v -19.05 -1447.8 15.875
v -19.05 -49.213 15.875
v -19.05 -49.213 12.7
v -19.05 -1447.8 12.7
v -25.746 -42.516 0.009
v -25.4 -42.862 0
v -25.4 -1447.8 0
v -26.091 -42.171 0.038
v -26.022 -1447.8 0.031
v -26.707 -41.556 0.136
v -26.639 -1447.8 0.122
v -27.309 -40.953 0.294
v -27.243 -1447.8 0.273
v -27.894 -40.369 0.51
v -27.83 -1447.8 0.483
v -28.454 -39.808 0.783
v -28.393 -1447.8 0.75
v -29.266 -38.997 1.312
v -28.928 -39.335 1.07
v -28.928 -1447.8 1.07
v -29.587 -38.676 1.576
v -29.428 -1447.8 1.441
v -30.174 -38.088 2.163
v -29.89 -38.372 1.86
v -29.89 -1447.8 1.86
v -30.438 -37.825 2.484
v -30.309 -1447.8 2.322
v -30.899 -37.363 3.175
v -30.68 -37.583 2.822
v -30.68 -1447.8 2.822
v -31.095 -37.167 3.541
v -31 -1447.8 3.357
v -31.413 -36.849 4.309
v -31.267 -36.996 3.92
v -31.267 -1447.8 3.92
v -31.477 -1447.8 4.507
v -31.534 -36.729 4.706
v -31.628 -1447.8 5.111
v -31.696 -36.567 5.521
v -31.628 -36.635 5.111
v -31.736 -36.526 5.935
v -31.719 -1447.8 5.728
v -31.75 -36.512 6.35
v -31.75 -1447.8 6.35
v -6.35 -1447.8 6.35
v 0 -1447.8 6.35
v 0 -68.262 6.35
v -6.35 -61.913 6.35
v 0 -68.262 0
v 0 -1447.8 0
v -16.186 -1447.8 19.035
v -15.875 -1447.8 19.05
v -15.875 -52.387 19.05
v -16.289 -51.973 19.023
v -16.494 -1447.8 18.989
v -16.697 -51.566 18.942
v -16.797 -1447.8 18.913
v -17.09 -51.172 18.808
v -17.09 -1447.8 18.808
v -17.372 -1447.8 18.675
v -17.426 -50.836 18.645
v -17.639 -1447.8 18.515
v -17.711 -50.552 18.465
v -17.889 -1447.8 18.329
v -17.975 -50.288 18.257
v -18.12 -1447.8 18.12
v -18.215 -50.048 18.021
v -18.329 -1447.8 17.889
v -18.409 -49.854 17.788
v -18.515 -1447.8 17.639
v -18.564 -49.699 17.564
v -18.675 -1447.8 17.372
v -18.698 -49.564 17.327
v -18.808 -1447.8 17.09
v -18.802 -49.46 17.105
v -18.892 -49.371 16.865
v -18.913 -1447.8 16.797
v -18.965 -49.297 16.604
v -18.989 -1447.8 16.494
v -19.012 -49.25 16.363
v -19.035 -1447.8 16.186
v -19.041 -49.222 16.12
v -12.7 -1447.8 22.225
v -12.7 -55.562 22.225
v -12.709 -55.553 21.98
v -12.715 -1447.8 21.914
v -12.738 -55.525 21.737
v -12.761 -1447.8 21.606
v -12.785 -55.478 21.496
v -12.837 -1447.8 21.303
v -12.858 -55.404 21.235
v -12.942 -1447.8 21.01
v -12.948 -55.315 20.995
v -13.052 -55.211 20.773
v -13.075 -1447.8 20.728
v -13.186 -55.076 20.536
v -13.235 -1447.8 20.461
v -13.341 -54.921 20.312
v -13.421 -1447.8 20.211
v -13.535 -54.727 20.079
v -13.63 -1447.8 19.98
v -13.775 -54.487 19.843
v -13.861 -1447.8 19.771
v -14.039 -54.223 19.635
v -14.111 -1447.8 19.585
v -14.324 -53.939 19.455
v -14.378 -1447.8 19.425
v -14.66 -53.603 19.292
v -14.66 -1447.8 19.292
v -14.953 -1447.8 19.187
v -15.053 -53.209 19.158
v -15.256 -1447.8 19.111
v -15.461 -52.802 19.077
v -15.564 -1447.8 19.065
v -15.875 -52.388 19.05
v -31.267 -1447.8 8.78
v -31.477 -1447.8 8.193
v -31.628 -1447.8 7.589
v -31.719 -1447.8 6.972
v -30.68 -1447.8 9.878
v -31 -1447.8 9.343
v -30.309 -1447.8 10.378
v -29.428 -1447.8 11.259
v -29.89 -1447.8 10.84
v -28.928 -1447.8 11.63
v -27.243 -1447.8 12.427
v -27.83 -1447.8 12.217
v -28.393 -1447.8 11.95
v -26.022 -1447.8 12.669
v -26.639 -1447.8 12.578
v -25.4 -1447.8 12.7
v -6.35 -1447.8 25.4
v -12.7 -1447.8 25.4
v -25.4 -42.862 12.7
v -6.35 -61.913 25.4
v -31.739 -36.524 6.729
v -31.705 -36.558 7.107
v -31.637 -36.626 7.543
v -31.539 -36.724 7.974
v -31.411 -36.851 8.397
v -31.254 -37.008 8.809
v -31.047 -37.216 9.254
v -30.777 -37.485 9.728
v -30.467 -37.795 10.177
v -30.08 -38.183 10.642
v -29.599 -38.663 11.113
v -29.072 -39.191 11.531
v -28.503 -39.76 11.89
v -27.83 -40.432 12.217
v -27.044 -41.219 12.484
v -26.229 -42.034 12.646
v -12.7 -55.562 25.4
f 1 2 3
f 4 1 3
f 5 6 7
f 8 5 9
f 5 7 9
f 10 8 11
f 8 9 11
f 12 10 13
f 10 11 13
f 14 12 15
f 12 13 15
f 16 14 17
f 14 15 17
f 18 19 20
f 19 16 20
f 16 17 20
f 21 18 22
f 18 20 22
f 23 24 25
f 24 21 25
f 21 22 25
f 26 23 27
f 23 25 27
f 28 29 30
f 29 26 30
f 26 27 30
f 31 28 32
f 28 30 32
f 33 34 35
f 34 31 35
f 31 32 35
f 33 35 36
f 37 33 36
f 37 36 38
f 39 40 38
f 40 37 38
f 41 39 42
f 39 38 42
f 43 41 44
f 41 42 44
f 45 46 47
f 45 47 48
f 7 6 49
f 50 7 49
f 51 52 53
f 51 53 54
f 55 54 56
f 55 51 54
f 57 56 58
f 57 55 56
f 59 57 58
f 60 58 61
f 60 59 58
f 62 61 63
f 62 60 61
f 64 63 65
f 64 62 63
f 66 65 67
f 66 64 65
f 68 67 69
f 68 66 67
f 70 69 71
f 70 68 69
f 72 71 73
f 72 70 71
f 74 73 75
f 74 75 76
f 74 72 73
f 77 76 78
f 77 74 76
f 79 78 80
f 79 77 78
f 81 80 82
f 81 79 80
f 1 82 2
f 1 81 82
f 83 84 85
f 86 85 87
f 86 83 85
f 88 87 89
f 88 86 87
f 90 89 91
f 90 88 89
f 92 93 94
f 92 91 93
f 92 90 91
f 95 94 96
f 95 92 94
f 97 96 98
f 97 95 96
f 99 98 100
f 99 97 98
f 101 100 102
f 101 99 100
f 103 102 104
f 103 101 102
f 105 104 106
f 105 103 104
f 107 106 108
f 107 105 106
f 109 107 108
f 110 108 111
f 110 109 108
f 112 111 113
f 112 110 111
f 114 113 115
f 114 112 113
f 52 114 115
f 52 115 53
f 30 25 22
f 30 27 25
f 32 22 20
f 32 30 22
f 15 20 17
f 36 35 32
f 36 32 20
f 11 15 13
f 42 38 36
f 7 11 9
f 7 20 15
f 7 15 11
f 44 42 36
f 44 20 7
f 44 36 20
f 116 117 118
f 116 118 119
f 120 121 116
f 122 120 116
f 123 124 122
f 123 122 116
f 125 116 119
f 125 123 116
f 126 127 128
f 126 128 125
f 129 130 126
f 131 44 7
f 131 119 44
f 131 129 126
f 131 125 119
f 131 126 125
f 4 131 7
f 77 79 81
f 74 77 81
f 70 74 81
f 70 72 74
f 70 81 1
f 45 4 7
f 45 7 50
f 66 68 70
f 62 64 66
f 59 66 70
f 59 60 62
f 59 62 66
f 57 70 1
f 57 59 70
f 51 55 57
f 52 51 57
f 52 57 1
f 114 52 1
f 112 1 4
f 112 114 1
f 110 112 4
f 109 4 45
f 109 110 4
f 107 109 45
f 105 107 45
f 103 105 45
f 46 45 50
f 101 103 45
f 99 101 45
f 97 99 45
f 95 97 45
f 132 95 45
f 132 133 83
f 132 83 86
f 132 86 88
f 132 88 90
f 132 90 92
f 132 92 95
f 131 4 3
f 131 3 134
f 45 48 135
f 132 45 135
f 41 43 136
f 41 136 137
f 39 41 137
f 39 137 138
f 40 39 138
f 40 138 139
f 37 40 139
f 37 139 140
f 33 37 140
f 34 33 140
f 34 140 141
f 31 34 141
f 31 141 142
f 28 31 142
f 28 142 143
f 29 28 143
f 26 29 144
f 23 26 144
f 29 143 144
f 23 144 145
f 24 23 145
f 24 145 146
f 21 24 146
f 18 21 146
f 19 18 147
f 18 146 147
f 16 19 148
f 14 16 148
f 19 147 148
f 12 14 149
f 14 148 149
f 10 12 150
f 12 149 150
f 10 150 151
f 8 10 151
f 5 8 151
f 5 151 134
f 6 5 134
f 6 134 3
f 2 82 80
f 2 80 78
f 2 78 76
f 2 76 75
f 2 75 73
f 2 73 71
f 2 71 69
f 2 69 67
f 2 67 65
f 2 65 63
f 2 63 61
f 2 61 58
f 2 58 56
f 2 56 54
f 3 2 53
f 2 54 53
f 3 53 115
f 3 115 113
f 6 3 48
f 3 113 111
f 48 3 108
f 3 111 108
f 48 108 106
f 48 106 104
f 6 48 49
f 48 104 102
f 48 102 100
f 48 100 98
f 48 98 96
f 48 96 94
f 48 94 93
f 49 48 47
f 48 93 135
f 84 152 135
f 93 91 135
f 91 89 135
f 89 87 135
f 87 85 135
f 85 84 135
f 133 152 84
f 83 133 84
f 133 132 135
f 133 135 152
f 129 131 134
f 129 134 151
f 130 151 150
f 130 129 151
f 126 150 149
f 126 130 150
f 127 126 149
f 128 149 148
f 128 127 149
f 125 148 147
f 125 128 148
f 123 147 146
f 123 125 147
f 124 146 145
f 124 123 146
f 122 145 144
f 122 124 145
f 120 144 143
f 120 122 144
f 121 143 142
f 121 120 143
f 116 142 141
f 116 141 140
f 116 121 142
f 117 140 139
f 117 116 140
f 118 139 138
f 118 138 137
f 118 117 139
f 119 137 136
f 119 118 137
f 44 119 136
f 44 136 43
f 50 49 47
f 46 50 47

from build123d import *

# Parameters (mm, degrees)
F1_DEPTH = 1447.8
F2_R     = 3.17499
F3_R     = 6.34999
F5_DEPTH = 58.42


# Not quite as in the source:
# - a fillet or chamfer is up to 0.001 mm smaller than in the source, because OpenCascade refuses the exact size


with BuildPart() as f1:
    # F0 (on Front) → F1 (new body)
    with BuildSketch(Plane.XZ):
        Polygon((-6.35, 6.35), (-6.35, 25.4), (-12.7, 25.4), (-12.7, 19.05), (-19.05, 19.05), (-19.05, 12.7), (-31.75, 12.7), (-31.75, 0), (0, 0), (0, 6.35), align=None)
    extrude(amount=F1_DEPTH)

    # F2 (radius 3.175 in the source; OpenCascade refuses exactly that, so slightly less here)
    f2_edges = [f1.edges().sort_by_distance(p)[0] for p in [
        (-12.7, -723.9, 19.05),
        (-19.05, -723.9, 19.05),
    ]]
    fillet(f2_edges, radius=F2_R)

    # F3 (radius 6.35 in the source; OpenCascade refuses exactly that, so slightly less here)
    f3_edges = [f1.edges().sort_by_distance(p)[0] for p in [
        (-31.75, -723.9, 12.7),
        (-31.75, -723.9, 0),
    ]]
    fillet(f3_edges, radius=F3_R)

    # F4 (on face) → F5 (cut, symmetric)
    with BuildSketch(Plane.XY.offset(6.35)):
        Polygon((-49.2702007145, -18.9922992855), (0, -68.2625), (0, 0), (-49.2702007145, 0), align=None)
    extrude(amount=F5_DEPTH, both=True, mode=Mode.SUBTRACT)


solid = f1.part
